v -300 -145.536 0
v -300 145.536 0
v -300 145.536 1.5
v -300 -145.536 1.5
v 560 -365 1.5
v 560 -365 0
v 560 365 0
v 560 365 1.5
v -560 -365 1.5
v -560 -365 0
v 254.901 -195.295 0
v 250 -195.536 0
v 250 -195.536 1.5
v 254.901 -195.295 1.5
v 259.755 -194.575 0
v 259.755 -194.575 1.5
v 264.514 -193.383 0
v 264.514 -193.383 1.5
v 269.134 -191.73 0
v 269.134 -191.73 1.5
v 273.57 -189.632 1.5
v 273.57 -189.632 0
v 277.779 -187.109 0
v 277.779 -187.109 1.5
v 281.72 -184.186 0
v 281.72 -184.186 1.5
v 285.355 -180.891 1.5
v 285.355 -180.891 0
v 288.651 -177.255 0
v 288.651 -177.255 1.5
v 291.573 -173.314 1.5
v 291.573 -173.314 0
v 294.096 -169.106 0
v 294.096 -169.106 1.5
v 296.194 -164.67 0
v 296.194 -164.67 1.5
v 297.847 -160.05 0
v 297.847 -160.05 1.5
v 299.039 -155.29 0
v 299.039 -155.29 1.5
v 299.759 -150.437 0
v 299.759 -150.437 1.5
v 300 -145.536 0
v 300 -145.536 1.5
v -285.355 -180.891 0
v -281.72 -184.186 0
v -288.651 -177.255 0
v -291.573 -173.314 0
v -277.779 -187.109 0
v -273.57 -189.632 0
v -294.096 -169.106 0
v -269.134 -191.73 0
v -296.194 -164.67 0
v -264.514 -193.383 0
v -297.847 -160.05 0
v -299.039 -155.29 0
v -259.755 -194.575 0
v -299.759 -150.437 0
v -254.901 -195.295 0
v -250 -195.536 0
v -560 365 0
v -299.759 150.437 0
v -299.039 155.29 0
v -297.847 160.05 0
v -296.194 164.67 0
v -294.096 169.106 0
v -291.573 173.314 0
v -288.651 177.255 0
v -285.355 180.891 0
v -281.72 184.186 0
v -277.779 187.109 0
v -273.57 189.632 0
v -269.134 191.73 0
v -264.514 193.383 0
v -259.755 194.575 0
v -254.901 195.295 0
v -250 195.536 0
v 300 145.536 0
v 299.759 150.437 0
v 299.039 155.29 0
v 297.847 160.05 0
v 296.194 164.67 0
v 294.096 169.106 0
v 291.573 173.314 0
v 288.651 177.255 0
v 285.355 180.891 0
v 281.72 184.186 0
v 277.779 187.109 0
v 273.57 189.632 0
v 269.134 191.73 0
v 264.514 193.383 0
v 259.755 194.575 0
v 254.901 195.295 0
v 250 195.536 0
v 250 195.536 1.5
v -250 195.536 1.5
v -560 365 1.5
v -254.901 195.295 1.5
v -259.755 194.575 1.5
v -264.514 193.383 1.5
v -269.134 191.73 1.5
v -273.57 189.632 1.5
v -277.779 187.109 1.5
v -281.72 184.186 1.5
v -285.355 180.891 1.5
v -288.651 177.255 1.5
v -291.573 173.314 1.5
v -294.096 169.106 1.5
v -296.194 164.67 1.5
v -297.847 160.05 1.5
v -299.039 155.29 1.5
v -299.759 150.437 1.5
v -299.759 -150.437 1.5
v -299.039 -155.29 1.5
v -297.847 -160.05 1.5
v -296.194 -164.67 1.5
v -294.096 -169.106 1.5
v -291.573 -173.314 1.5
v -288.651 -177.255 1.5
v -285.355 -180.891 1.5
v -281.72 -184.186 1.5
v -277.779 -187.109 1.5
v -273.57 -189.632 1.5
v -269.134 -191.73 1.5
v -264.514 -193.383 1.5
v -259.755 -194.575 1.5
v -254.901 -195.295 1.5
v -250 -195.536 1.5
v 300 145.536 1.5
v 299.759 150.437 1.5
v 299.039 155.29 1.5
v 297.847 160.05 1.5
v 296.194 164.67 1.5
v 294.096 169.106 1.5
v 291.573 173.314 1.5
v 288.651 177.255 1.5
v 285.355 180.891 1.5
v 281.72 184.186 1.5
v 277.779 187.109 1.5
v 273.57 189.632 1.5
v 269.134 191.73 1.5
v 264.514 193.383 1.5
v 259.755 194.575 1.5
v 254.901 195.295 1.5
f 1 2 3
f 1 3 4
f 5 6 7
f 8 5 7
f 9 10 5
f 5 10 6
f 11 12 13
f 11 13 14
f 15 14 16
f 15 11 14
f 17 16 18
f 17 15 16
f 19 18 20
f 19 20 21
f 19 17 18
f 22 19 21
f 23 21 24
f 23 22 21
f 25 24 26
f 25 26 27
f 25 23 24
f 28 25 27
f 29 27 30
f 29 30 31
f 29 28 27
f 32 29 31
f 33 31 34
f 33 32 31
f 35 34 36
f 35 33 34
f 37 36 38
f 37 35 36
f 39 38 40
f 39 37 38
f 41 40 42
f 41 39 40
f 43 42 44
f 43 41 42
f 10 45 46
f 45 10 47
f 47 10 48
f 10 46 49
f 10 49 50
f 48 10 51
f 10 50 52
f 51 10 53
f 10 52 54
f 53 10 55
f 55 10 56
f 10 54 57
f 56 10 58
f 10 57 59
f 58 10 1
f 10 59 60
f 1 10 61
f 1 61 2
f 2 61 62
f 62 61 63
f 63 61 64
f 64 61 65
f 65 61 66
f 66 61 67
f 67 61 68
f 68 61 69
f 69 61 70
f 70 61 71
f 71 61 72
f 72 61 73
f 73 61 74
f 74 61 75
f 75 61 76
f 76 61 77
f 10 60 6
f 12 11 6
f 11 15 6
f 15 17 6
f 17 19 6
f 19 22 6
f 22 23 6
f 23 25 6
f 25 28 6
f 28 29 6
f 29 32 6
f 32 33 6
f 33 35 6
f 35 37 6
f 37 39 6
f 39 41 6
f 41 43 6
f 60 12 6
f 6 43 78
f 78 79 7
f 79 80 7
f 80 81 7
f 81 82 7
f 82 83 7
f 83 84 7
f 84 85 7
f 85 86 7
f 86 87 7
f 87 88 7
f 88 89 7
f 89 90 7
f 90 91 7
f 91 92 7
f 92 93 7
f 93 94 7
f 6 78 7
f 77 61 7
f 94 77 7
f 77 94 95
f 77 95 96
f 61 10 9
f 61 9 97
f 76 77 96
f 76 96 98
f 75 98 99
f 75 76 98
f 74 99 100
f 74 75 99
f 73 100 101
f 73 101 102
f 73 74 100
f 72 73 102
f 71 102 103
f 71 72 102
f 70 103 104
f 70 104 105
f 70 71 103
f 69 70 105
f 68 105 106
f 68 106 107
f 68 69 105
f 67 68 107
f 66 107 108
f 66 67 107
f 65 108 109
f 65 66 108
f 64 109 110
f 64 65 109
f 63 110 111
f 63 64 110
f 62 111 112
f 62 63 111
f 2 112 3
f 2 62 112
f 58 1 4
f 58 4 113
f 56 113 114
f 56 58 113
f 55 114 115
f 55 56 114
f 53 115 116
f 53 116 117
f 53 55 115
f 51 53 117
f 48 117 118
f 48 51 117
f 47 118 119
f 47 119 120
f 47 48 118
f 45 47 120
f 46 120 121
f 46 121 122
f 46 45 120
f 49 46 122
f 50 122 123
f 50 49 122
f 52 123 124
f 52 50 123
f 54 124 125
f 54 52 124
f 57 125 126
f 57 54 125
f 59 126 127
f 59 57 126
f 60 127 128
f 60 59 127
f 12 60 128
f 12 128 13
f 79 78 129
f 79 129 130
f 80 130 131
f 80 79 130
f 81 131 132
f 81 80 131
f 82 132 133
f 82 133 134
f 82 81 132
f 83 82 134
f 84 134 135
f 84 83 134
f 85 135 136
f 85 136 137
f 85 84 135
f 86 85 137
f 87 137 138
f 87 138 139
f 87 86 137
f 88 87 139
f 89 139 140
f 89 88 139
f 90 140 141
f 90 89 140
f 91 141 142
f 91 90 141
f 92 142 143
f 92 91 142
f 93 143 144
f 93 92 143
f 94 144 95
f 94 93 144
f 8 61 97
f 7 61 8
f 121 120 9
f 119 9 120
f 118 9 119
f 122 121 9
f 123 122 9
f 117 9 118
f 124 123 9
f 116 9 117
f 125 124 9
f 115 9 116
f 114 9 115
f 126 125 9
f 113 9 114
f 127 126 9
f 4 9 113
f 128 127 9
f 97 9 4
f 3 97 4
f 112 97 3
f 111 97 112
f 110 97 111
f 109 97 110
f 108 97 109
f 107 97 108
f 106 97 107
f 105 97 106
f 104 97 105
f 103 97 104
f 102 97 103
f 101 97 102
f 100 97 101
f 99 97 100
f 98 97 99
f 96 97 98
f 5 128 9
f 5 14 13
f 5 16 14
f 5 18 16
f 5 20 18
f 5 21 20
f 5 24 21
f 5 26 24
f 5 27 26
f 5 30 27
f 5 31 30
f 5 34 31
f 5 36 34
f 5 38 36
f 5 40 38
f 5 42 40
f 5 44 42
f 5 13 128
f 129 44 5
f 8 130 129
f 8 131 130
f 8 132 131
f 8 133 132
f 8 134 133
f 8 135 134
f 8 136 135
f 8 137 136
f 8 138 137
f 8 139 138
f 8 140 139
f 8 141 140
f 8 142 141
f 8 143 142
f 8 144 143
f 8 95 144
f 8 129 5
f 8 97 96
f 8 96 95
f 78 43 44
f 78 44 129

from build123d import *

# Parameters (mm, degrees)
SKETCH1_W           = 1120
SKETCH1_H           = 730
BOSS_EXTRUDE2_DEPTH = 1.5


with BuildPart() as part:
    # Sketch1 → Boss-Extrude2 (new body)
    with BuildSketch(Plane.XY):
        Rectangle(SKETCH1_W, SKETCH1_H)
        with BuildLine():
            Line((250, 195.535714286), (-250, 195.535714286))
            ThreePointArc((-250, 195.535714286), (-285.355339059, 180.891053345), (-300, 145.535714286))
            Line((-300, 145.535714286), (-300, -145.535714286))
            ThreePointArc((-300, -145.535714286), (-285.355339059, -180.891053345), (-250, -195.535714286))
            Line((-250, -195.535714286), (250, -195.535714286))
            ThreePointArc((250, -195.535714286), (285.355339059, -180.891053345), (300, -145.535714286))
            Line((300, -145.535714286), (300, 145.535714286))
            ThreePointArc((300, 145.535714286), (285.355339059, 180.891053345), (250, 195.535714286))
        make_face(mode=Mode.SUBTRACT)
    extrude(amount=BOSS_EXTRUDE2_DEPTH)


solid = part.part
